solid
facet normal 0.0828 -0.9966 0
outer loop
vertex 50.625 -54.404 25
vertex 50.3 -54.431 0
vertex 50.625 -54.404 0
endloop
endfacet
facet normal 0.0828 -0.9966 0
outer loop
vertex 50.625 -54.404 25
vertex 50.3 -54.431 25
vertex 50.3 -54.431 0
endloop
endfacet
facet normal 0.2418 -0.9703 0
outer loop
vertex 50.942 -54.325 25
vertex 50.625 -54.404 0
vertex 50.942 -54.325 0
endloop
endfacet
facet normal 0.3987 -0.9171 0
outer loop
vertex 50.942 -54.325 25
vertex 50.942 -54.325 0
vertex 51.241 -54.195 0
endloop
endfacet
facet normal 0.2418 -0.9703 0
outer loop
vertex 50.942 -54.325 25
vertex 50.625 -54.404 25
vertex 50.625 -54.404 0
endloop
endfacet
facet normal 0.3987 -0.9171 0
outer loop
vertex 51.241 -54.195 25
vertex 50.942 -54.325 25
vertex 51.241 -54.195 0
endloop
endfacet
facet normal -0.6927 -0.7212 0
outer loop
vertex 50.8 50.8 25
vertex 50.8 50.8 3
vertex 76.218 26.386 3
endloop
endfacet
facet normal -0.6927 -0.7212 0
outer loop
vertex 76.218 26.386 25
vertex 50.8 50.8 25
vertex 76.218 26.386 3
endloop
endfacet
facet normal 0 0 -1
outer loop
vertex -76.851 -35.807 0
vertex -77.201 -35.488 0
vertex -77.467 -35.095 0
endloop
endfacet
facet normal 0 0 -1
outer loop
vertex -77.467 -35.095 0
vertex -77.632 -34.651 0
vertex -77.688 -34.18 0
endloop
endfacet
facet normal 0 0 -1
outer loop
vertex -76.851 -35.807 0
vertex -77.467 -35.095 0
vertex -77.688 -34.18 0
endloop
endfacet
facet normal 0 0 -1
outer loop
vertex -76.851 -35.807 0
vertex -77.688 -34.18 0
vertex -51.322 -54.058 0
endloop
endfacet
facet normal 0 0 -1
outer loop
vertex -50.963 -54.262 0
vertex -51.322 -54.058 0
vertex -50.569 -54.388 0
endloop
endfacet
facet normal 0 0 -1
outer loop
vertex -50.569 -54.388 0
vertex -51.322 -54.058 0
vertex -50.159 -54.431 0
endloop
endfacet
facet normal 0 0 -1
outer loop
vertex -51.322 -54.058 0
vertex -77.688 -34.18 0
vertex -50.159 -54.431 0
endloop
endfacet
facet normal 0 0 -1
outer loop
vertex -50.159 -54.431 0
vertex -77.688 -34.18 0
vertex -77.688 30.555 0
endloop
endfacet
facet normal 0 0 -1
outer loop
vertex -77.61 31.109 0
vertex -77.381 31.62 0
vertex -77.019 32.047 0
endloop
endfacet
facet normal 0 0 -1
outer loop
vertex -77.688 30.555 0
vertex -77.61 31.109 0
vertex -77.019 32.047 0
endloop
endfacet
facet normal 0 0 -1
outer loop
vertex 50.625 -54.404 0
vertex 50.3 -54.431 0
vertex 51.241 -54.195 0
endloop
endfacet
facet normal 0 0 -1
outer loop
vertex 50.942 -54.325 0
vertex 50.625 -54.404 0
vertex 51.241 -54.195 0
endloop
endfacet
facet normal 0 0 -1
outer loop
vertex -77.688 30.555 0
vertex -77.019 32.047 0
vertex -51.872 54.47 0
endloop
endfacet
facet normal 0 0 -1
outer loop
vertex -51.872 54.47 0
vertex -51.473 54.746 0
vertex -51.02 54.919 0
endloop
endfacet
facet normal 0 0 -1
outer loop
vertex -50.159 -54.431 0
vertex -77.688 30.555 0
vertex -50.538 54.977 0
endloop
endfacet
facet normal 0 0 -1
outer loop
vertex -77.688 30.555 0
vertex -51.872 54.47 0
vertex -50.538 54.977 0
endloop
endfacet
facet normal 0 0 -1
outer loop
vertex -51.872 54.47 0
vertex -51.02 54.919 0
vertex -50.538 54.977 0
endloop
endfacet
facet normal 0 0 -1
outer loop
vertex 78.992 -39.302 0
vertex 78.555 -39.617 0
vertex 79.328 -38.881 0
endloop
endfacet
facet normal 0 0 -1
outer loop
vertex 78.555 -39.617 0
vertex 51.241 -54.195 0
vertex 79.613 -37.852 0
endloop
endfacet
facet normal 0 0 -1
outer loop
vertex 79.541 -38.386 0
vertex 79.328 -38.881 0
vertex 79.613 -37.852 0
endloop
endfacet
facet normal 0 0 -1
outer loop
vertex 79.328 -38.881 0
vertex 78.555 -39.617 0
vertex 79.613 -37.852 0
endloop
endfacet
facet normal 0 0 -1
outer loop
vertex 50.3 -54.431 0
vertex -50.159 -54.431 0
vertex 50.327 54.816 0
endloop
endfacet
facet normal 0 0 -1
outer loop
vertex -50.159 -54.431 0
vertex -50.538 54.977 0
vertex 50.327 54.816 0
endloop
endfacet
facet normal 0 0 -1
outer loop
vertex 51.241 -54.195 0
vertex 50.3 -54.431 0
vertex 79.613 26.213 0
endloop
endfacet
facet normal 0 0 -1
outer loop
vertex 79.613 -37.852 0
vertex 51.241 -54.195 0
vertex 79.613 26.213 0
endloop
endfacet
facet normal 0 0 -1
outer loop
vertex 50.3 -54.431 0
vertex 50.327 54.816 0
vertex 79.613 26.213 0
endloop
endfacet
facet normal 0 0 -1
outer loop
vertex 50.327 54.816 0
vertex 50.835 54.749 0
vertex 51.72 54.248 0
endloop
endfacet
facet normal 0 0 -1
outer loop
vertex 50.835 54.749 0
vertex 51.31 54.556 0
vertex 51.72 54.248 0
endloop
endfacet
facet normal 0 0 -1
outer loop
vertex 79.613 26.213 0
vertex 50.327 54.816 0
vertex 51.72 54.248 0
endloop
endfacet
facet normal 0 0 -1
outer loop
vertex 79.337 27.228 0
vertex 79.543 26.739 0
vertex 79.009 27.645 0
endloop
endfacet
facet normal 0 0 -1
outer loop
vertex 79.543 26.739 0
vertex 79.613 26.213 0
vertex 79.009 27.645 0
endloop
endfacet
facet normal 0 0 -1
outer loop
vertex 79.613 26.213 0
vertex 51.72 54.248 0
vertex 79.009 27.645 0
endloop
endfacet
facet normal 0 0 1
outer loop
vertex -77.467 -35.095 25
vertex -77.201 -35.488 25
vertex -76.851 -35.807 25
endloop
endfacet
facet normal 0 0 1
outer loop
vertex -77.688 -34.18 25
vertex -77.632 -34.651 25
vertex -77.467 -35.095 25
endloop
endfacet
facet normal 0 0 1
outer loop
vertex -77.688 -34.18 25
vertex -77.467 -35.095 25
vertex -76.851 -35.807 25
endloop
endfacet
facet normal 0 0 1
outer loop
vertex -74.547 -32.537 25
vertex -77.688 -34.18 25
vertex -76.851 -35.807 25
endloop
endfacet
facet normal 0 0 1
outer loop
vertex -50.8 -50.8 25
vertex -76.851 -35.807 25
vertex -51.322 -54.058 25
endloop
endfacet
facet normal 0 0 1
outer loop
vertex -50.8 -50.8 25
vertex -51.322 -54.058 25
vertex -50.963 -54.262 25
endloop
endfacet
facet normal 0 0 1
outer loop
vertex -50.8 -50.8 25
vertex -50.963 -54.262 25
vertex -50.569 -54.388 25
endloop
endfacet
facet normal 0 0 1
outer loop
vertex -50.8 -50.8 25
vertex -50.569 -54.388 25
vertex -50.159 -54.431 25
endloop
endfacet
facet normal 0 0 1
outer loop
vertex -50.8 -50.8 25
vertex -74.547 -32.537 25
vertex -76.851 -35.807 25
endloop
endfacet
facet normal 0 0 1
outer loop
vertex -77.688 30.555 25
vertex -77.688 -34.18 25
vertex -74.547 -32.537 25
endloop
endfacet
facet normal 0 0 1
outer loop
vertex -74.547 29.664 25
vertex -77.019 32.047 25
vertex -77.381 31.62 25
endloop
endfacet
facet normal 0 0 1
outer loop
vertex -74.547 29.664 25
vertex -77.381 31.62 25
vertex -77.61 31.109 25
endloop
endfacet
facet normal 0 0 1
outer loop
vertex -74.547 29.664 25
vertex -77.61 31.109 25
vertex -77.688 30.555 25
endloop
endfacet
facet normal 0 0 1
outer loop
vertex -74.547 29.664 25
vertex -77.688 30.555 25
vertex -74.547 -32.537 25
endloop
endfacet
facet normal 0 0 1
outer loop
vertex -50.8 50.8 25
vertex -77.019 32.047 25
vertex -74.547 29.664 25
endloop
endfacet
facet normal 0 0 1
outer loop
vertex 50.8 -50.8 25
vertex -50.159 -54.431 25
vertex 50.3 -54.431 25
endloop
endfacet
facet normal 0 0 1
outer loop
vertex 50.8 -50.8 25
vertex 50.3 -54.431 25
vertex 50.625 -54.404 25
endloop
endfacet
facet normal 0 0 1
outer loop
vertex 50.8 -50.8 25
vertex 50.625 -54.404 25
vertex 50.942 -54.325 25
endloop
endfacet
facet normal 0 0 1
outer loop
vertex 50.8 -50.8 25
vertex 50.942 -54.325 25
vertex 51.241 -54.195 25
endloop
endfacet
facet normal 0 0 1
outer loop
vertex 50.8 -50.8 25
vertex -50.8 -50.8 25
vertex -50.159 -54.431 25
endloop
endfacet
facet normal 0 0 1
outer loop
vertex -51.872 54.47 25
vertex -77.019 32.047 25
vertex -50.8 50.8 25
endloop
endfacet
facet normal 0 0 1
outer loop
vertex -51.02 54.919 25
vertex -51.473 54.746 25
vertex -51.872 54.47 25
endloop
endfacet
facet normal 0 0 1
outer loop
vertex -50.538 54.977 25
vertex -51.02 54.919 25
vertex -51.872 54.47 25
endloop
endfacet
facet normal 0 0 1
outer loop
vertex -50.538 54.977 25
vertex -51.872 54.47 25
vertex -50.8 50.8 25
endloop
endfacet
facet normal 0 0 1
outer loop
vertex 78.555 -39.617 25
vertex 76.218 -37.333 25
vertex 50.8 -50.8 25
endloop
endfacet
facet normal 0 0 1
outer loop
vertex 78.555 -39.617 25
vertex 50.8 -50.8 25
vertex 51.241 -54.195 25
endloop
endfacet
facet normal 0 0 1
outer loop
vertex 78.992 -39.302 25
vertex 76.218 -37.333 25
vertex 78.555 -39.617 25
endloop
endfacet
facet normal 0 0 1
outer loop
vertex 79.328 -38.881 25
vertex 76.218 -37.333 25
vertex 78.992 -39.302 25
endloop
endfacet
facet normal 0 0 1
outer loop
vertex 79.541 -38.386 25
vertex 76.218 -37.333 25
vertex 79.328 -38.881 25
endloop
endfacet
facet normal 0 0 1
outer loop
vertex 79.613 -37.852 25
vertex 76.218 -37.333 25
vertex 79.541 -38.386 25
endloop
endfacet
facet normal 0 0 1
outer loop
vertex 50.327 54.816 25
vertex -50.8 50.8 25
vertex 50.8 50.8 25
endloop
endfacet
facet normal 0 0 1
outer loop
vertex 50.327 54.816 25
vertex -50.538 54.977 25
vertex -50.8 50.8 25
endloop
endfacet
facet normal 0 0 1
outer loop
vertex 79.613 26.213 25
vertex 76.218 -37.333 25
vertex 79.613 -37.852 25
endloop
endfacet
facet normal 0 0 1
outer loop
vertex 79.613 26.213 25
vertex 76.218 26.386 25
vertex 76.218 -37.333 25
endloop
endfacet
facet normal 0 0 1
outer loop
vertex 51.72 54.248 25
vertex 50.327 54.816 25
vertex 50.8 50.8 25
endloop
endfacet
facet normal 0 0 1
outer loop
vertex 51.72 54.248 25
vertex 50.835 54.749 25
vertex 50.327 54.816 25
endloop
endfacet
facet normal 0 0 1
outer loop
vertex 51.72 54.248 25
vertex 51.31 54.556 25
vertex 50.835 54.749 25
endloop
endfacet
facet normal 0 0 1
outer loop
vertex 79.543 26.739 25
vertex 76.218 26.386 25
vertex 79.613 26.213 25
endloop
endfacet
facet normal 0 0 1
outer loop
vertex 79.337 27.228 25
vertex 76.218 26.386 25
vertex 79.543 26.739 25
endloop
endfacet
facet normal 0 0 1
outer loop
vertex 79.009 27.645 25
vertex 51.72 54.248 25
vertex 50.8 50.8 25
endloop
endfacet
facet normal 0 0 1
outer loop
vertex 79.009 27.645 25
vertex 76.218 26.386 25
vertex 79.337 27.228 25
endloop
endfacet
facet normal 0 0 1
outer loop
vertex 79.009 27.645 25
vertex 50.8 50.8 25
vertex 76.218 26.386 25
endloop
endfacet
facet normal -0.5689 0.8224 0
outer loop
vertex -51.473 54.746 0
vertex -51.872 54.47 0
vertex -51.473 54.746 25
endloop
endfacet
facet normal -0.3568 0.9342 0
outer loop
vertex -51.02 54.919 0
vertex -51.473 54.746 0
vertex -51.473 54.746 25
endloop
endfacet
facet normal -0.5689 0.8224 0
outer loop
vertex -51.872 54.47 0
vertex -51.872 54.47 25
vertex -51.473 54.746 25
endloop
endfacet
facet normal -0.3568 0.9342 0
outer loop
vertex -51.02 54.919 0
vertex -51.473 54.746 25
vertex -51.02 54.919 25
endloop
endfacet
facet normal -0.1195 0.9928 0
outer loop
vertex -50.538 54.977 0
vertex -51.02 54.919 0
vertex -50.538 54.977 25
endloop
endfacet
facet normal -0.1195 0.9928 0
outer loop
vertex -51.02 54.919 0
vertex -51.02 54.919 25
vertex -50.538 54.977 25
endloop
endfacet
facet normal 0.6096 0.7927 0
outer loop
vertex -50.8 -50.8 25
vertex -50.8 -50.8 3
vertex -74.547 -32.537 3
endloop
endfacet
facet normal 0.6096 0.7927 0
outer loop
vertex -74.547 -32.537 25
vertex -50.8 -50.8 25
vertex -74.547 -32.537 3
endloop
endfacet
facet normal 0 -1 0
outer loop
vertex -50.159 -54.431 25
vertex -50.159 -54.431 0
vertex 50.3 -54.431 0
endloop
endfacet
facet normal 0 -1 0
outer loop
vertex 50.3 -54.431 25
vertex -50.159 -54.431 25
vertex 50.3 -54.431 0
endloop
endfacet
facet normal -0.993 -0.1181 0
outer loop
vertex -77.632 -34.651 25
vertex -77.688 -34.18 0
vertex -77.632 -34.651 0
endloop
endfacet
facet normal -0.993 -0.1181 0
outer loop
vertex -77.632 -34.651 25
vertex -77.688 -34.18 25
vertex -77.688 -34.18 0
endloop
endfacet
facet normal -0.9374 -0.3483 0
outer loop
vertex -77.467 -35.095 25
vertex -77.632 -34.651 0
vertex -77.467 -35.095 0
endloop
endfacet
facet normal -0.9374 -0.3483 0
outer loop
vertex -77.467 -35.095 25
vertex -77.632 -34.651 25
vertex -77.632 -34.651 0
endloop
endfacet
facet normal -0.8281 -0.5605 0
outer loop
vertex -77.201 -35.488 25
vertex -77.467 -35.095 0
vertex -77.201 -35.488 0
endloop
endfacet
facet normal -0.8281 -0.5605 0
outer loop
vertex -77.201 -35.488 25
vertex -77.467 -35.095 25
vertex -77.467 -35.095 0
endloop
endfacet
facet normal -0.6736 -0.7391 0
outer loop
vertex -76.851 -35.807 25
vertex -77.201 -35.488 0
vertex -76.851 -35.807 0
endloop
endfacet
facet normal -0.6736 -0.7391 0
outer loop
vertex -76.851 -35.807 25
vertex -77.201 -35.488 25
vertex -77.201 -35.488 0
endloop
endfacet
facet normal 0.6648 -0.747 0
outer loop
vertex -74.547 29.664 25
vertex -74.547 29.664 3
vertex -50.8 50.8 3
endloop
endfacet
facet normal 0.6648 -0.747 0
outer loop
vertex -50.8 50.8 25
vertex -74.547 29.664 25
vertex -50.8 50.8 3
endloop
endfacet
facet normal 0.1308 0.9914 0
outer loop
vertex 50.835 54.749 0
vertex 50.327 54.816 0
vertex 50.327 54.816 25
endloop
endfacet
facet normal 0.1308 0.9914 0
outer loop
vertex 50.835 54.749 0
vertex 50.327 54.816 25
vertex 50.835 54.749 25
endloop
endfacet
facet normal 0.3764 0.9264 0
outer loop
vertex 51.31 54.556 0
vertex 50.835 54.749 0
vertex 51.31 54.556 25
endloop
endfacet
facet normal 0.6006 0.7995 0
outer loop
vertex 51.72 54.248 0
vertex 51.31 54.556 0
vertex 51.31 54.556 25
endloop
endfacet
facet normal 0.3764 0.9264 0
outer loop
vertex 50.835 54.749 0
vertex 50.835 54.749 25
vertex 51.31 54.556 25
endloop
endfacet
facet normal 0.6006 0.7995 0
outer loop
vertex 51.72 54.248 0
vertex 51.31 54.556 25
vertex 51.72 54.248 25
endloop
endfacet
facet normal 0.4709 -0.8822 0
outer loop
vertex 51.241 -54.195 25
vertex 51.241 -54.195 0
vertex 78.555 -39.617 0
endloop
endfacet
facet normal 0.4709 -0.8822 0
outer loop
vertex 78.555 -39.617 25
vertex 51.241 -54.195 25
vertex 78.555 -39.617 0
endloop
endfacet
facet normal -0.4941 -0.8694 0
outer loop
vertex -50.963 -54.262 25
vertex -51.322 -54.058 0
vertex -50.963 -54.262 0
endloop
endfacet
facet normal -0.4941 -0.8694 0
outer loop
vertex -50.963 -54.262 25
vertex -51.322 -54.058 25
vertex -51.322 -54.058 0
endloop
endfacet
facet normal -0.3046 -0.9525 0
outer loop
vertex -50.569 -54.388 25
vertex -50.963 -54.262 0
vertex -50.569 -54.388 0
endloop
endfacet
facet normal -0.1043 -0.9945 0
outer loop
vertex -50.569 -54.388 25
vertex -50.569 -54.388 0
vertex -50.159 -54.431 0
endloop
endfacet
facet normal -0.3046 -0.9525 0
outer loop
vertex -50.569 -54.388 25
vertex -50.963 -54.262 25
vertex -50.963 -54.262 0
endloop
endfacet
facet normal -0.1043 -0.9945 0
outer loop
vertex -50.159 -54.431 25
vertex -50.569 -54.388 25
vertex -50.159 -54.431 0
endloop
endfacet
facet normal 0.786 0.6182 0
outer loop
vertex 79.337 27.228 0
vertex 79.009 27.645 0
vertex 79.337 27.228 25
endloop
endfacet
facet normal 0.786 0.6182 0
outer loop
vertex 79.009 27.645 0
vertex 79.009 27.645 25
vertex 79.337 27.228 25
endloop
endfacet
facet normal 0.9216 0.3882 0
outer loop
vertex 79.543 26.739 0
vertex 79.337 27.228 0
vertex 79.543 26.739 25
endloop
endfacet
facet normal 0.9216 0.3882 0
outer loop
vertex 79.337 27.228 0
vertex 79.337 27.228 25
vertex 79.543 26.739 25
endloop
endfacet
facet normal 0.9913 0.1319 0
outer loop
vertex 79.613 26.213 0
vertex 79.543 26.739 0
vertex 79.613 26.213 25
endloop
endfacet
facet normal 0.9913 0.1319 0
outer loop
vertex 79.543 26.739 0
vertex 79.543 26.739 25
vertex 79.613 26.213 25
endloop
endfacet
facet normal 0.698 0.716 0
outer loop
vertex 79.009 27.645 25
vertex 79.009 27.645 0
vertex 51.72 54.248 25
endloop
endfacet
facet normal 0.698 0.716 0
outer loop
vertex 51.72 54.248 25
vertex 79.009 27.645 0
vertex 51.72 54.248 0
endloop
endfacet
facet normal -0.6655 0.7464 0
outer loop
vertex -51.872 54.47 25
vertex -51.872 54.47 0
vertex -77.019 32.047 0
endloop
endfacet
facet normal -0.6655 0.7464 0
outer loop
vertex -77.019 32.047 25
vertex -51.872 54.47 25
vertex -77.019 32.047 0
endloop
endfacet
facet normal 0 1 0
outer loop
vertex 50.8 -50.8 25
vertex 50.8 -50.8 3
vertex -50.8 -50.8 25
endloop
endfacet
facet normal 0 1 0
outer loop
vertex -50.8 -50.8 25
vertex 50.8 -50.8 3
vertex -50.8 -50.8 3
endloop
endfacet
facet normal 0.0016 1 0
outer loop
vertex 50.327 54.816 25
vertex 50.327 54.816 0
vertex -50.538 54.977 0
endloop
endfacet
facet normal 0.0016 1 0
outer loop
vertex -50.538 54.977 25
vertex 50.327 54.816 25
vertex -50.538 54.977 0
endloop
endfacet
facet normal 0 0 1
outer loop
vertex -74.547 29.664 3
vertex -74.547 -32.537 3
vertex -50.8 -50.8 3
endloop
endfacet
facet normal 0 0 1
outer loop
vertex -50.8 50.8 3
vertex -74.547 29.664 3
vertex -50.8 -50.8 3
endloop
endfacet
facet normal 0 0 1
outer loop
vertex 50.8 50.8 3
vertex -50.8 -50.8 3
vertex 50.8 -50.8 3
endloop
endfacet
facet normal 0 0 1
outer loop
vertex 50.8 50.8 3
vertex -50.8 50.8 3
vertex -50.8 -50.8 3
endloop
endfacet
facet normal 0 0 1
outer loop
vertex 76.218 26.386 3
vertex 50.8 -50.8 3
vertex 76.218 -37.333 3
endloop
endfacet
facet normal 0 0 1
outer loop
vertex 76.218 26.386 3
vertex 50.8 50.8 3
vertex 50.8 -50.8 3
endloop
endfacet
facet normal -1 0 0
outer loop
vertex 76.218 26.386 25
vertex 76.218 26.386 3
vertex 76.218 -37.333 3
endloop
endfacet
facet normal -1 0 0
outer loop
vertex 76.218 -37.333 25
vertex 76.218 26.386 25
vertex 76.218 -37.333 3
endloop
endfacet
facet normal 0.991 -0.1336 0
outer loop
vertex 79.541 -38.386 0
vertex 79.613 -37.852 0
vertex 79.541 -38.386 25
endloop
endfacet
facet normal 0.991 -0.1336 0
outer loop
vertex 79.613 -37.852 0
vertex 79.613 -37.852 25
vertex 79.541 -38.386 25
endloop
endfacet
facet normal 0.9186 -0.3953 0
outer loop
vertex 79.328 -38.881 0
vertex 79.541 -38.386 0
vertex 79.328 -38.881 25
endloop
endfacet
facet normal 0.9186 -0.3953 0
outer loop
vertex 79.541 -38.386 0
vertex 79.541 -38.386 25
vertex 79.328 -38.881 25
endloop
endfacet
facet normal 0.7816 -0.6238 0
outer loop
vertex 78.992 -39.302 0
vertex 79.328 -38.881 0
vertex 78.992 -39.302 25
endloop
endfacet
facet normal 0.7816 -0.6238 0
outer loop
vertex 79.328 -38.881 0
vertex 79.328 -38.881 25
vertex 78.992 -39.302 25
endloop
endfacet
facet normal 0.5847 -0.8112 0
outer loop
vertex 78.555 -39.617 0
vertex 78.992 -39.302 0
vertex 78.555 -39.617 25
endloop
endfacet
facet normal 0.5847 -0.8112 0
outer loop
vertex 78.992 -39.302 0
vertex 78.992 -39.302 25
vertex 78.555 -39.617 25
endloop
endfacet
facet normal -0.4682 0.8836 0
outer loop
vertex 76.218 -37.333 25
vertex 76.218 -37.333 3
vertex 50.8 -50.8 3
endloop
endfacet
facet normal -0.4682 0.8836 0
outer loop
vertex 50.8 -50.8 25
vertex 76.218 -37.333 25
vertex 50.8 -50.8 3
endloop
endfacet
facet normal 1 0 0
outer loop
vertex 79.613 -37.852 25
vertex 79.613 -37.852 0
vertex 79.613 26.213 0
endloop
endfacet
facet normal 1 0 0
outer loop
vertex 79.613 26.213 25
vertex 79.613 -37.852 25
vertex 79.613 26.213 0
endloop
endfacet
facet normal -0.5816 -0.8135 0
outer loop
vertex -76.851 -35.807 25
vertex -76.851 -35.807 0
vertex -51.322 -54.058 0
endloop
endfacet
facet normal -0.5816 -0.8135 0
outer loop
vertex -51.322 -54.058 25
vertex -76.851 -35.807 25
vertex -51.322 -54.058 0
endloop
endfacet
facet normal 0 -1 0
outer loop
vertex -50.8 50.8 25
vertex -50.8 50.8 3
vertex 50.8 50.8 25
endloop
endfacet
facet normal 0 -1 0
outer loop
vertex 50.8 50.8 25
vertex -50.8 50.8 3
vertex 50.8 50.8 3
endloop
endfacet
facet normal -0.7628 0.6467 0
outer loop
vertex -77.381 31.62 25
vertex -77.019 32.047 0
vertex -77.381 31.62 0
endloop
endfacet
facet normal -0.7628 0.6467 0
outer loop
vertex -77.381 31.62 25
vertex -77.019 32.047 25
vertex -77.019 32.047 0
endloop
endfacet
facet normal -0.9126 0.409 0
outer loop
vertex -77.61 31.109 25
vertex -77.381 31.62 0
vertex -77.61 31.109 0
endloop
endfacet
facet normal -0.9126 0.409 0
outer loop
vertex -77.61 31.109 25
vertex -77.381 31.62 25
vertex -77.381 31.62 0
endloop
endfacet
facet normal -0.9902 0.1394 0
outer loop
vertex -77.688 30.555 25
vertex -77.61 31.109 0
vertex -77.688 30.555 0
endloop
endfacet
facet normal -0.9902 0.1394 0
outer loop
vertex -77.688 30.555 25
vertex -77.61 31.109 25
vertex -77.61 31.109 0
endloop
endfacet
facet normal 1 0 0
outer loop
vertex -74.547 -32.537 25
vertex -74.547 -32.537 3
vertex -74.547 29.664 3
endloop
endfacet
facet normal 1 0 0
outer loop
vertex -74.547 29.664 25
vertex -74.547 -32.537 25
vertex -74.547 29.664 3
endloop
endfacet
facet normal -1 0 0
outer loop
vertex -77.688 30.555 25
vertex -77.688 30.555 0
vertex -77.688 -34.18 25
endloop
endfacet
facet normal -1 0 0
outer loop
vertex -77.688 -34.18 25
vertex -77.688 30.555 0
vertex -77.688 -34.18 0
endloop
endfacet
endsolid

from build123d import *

# Parameters (mm, degrees)
F0_W     = 101.6
F0_H     = 101.6
F1_DEPTH = 3
F2_DEPTH = 25
F3_R     = 2


with BuildPart() as f1:
    # F0 (on Top) → F1 (new body)
    with BuildSketch(Plane.XY):
        Polygon((-50.8, -50.8), (-50.8, 50.8), (-74.547097, 29.664359), (-74.547097, -32.537002), align=None)
        Rectangle(F0_W, F0_H)
        Polygon((76.217584, 26.386153), (50.8, 50.8), (50.8, -50.8), (76.217584, -37.332729), align=None)
    extrude(amount=F1_DEPTH)

    # F0 (on Top) → F2 (join)
    with BuildSketch(Plane.XY):
        Polygon((-51.30187, 54.977957), (-77.688023, 31.450987), (-77.688023, -35.208765), (-50.8, -54.43063), (50.8, -54.43063), (79.613134, -39.051957), (79.613134, 27.056271), (51.138487, 54.814577), align=None)
        Polygon((-74.547097, 29.664359), (-50.8, 50.8), (50.8, 50.8), (76.217584, 26.386153), (76.217584, -37.332729), (50.8, -50.8), (-50.8, -50.8), (-74.547097, -32.537002), align=None, mode=Mode.SUBTRACT)
    extrude(amount=F2_DEPTH)

    # F3
    f3_edges = [f1.edges().sort_by_distance(p)[0] for p in [
        (-50.8, -54.43063, 12.5),
        (-77.688023, -35.208765, 12.5),
        (50.8, -54.43063, 12.5),
        (79.613134, -39.051957, 12.5),
        (79.613134, 27.056271, 12.5),
        (51.138487, 54.814577, 12.5),
        (-51.30187, 54.977957, 12.5),
        (-77.688023, 31.450987, 12.5),
    ]]
    fillet(f3_edges, radius=F3_R)


solid = f1.part
